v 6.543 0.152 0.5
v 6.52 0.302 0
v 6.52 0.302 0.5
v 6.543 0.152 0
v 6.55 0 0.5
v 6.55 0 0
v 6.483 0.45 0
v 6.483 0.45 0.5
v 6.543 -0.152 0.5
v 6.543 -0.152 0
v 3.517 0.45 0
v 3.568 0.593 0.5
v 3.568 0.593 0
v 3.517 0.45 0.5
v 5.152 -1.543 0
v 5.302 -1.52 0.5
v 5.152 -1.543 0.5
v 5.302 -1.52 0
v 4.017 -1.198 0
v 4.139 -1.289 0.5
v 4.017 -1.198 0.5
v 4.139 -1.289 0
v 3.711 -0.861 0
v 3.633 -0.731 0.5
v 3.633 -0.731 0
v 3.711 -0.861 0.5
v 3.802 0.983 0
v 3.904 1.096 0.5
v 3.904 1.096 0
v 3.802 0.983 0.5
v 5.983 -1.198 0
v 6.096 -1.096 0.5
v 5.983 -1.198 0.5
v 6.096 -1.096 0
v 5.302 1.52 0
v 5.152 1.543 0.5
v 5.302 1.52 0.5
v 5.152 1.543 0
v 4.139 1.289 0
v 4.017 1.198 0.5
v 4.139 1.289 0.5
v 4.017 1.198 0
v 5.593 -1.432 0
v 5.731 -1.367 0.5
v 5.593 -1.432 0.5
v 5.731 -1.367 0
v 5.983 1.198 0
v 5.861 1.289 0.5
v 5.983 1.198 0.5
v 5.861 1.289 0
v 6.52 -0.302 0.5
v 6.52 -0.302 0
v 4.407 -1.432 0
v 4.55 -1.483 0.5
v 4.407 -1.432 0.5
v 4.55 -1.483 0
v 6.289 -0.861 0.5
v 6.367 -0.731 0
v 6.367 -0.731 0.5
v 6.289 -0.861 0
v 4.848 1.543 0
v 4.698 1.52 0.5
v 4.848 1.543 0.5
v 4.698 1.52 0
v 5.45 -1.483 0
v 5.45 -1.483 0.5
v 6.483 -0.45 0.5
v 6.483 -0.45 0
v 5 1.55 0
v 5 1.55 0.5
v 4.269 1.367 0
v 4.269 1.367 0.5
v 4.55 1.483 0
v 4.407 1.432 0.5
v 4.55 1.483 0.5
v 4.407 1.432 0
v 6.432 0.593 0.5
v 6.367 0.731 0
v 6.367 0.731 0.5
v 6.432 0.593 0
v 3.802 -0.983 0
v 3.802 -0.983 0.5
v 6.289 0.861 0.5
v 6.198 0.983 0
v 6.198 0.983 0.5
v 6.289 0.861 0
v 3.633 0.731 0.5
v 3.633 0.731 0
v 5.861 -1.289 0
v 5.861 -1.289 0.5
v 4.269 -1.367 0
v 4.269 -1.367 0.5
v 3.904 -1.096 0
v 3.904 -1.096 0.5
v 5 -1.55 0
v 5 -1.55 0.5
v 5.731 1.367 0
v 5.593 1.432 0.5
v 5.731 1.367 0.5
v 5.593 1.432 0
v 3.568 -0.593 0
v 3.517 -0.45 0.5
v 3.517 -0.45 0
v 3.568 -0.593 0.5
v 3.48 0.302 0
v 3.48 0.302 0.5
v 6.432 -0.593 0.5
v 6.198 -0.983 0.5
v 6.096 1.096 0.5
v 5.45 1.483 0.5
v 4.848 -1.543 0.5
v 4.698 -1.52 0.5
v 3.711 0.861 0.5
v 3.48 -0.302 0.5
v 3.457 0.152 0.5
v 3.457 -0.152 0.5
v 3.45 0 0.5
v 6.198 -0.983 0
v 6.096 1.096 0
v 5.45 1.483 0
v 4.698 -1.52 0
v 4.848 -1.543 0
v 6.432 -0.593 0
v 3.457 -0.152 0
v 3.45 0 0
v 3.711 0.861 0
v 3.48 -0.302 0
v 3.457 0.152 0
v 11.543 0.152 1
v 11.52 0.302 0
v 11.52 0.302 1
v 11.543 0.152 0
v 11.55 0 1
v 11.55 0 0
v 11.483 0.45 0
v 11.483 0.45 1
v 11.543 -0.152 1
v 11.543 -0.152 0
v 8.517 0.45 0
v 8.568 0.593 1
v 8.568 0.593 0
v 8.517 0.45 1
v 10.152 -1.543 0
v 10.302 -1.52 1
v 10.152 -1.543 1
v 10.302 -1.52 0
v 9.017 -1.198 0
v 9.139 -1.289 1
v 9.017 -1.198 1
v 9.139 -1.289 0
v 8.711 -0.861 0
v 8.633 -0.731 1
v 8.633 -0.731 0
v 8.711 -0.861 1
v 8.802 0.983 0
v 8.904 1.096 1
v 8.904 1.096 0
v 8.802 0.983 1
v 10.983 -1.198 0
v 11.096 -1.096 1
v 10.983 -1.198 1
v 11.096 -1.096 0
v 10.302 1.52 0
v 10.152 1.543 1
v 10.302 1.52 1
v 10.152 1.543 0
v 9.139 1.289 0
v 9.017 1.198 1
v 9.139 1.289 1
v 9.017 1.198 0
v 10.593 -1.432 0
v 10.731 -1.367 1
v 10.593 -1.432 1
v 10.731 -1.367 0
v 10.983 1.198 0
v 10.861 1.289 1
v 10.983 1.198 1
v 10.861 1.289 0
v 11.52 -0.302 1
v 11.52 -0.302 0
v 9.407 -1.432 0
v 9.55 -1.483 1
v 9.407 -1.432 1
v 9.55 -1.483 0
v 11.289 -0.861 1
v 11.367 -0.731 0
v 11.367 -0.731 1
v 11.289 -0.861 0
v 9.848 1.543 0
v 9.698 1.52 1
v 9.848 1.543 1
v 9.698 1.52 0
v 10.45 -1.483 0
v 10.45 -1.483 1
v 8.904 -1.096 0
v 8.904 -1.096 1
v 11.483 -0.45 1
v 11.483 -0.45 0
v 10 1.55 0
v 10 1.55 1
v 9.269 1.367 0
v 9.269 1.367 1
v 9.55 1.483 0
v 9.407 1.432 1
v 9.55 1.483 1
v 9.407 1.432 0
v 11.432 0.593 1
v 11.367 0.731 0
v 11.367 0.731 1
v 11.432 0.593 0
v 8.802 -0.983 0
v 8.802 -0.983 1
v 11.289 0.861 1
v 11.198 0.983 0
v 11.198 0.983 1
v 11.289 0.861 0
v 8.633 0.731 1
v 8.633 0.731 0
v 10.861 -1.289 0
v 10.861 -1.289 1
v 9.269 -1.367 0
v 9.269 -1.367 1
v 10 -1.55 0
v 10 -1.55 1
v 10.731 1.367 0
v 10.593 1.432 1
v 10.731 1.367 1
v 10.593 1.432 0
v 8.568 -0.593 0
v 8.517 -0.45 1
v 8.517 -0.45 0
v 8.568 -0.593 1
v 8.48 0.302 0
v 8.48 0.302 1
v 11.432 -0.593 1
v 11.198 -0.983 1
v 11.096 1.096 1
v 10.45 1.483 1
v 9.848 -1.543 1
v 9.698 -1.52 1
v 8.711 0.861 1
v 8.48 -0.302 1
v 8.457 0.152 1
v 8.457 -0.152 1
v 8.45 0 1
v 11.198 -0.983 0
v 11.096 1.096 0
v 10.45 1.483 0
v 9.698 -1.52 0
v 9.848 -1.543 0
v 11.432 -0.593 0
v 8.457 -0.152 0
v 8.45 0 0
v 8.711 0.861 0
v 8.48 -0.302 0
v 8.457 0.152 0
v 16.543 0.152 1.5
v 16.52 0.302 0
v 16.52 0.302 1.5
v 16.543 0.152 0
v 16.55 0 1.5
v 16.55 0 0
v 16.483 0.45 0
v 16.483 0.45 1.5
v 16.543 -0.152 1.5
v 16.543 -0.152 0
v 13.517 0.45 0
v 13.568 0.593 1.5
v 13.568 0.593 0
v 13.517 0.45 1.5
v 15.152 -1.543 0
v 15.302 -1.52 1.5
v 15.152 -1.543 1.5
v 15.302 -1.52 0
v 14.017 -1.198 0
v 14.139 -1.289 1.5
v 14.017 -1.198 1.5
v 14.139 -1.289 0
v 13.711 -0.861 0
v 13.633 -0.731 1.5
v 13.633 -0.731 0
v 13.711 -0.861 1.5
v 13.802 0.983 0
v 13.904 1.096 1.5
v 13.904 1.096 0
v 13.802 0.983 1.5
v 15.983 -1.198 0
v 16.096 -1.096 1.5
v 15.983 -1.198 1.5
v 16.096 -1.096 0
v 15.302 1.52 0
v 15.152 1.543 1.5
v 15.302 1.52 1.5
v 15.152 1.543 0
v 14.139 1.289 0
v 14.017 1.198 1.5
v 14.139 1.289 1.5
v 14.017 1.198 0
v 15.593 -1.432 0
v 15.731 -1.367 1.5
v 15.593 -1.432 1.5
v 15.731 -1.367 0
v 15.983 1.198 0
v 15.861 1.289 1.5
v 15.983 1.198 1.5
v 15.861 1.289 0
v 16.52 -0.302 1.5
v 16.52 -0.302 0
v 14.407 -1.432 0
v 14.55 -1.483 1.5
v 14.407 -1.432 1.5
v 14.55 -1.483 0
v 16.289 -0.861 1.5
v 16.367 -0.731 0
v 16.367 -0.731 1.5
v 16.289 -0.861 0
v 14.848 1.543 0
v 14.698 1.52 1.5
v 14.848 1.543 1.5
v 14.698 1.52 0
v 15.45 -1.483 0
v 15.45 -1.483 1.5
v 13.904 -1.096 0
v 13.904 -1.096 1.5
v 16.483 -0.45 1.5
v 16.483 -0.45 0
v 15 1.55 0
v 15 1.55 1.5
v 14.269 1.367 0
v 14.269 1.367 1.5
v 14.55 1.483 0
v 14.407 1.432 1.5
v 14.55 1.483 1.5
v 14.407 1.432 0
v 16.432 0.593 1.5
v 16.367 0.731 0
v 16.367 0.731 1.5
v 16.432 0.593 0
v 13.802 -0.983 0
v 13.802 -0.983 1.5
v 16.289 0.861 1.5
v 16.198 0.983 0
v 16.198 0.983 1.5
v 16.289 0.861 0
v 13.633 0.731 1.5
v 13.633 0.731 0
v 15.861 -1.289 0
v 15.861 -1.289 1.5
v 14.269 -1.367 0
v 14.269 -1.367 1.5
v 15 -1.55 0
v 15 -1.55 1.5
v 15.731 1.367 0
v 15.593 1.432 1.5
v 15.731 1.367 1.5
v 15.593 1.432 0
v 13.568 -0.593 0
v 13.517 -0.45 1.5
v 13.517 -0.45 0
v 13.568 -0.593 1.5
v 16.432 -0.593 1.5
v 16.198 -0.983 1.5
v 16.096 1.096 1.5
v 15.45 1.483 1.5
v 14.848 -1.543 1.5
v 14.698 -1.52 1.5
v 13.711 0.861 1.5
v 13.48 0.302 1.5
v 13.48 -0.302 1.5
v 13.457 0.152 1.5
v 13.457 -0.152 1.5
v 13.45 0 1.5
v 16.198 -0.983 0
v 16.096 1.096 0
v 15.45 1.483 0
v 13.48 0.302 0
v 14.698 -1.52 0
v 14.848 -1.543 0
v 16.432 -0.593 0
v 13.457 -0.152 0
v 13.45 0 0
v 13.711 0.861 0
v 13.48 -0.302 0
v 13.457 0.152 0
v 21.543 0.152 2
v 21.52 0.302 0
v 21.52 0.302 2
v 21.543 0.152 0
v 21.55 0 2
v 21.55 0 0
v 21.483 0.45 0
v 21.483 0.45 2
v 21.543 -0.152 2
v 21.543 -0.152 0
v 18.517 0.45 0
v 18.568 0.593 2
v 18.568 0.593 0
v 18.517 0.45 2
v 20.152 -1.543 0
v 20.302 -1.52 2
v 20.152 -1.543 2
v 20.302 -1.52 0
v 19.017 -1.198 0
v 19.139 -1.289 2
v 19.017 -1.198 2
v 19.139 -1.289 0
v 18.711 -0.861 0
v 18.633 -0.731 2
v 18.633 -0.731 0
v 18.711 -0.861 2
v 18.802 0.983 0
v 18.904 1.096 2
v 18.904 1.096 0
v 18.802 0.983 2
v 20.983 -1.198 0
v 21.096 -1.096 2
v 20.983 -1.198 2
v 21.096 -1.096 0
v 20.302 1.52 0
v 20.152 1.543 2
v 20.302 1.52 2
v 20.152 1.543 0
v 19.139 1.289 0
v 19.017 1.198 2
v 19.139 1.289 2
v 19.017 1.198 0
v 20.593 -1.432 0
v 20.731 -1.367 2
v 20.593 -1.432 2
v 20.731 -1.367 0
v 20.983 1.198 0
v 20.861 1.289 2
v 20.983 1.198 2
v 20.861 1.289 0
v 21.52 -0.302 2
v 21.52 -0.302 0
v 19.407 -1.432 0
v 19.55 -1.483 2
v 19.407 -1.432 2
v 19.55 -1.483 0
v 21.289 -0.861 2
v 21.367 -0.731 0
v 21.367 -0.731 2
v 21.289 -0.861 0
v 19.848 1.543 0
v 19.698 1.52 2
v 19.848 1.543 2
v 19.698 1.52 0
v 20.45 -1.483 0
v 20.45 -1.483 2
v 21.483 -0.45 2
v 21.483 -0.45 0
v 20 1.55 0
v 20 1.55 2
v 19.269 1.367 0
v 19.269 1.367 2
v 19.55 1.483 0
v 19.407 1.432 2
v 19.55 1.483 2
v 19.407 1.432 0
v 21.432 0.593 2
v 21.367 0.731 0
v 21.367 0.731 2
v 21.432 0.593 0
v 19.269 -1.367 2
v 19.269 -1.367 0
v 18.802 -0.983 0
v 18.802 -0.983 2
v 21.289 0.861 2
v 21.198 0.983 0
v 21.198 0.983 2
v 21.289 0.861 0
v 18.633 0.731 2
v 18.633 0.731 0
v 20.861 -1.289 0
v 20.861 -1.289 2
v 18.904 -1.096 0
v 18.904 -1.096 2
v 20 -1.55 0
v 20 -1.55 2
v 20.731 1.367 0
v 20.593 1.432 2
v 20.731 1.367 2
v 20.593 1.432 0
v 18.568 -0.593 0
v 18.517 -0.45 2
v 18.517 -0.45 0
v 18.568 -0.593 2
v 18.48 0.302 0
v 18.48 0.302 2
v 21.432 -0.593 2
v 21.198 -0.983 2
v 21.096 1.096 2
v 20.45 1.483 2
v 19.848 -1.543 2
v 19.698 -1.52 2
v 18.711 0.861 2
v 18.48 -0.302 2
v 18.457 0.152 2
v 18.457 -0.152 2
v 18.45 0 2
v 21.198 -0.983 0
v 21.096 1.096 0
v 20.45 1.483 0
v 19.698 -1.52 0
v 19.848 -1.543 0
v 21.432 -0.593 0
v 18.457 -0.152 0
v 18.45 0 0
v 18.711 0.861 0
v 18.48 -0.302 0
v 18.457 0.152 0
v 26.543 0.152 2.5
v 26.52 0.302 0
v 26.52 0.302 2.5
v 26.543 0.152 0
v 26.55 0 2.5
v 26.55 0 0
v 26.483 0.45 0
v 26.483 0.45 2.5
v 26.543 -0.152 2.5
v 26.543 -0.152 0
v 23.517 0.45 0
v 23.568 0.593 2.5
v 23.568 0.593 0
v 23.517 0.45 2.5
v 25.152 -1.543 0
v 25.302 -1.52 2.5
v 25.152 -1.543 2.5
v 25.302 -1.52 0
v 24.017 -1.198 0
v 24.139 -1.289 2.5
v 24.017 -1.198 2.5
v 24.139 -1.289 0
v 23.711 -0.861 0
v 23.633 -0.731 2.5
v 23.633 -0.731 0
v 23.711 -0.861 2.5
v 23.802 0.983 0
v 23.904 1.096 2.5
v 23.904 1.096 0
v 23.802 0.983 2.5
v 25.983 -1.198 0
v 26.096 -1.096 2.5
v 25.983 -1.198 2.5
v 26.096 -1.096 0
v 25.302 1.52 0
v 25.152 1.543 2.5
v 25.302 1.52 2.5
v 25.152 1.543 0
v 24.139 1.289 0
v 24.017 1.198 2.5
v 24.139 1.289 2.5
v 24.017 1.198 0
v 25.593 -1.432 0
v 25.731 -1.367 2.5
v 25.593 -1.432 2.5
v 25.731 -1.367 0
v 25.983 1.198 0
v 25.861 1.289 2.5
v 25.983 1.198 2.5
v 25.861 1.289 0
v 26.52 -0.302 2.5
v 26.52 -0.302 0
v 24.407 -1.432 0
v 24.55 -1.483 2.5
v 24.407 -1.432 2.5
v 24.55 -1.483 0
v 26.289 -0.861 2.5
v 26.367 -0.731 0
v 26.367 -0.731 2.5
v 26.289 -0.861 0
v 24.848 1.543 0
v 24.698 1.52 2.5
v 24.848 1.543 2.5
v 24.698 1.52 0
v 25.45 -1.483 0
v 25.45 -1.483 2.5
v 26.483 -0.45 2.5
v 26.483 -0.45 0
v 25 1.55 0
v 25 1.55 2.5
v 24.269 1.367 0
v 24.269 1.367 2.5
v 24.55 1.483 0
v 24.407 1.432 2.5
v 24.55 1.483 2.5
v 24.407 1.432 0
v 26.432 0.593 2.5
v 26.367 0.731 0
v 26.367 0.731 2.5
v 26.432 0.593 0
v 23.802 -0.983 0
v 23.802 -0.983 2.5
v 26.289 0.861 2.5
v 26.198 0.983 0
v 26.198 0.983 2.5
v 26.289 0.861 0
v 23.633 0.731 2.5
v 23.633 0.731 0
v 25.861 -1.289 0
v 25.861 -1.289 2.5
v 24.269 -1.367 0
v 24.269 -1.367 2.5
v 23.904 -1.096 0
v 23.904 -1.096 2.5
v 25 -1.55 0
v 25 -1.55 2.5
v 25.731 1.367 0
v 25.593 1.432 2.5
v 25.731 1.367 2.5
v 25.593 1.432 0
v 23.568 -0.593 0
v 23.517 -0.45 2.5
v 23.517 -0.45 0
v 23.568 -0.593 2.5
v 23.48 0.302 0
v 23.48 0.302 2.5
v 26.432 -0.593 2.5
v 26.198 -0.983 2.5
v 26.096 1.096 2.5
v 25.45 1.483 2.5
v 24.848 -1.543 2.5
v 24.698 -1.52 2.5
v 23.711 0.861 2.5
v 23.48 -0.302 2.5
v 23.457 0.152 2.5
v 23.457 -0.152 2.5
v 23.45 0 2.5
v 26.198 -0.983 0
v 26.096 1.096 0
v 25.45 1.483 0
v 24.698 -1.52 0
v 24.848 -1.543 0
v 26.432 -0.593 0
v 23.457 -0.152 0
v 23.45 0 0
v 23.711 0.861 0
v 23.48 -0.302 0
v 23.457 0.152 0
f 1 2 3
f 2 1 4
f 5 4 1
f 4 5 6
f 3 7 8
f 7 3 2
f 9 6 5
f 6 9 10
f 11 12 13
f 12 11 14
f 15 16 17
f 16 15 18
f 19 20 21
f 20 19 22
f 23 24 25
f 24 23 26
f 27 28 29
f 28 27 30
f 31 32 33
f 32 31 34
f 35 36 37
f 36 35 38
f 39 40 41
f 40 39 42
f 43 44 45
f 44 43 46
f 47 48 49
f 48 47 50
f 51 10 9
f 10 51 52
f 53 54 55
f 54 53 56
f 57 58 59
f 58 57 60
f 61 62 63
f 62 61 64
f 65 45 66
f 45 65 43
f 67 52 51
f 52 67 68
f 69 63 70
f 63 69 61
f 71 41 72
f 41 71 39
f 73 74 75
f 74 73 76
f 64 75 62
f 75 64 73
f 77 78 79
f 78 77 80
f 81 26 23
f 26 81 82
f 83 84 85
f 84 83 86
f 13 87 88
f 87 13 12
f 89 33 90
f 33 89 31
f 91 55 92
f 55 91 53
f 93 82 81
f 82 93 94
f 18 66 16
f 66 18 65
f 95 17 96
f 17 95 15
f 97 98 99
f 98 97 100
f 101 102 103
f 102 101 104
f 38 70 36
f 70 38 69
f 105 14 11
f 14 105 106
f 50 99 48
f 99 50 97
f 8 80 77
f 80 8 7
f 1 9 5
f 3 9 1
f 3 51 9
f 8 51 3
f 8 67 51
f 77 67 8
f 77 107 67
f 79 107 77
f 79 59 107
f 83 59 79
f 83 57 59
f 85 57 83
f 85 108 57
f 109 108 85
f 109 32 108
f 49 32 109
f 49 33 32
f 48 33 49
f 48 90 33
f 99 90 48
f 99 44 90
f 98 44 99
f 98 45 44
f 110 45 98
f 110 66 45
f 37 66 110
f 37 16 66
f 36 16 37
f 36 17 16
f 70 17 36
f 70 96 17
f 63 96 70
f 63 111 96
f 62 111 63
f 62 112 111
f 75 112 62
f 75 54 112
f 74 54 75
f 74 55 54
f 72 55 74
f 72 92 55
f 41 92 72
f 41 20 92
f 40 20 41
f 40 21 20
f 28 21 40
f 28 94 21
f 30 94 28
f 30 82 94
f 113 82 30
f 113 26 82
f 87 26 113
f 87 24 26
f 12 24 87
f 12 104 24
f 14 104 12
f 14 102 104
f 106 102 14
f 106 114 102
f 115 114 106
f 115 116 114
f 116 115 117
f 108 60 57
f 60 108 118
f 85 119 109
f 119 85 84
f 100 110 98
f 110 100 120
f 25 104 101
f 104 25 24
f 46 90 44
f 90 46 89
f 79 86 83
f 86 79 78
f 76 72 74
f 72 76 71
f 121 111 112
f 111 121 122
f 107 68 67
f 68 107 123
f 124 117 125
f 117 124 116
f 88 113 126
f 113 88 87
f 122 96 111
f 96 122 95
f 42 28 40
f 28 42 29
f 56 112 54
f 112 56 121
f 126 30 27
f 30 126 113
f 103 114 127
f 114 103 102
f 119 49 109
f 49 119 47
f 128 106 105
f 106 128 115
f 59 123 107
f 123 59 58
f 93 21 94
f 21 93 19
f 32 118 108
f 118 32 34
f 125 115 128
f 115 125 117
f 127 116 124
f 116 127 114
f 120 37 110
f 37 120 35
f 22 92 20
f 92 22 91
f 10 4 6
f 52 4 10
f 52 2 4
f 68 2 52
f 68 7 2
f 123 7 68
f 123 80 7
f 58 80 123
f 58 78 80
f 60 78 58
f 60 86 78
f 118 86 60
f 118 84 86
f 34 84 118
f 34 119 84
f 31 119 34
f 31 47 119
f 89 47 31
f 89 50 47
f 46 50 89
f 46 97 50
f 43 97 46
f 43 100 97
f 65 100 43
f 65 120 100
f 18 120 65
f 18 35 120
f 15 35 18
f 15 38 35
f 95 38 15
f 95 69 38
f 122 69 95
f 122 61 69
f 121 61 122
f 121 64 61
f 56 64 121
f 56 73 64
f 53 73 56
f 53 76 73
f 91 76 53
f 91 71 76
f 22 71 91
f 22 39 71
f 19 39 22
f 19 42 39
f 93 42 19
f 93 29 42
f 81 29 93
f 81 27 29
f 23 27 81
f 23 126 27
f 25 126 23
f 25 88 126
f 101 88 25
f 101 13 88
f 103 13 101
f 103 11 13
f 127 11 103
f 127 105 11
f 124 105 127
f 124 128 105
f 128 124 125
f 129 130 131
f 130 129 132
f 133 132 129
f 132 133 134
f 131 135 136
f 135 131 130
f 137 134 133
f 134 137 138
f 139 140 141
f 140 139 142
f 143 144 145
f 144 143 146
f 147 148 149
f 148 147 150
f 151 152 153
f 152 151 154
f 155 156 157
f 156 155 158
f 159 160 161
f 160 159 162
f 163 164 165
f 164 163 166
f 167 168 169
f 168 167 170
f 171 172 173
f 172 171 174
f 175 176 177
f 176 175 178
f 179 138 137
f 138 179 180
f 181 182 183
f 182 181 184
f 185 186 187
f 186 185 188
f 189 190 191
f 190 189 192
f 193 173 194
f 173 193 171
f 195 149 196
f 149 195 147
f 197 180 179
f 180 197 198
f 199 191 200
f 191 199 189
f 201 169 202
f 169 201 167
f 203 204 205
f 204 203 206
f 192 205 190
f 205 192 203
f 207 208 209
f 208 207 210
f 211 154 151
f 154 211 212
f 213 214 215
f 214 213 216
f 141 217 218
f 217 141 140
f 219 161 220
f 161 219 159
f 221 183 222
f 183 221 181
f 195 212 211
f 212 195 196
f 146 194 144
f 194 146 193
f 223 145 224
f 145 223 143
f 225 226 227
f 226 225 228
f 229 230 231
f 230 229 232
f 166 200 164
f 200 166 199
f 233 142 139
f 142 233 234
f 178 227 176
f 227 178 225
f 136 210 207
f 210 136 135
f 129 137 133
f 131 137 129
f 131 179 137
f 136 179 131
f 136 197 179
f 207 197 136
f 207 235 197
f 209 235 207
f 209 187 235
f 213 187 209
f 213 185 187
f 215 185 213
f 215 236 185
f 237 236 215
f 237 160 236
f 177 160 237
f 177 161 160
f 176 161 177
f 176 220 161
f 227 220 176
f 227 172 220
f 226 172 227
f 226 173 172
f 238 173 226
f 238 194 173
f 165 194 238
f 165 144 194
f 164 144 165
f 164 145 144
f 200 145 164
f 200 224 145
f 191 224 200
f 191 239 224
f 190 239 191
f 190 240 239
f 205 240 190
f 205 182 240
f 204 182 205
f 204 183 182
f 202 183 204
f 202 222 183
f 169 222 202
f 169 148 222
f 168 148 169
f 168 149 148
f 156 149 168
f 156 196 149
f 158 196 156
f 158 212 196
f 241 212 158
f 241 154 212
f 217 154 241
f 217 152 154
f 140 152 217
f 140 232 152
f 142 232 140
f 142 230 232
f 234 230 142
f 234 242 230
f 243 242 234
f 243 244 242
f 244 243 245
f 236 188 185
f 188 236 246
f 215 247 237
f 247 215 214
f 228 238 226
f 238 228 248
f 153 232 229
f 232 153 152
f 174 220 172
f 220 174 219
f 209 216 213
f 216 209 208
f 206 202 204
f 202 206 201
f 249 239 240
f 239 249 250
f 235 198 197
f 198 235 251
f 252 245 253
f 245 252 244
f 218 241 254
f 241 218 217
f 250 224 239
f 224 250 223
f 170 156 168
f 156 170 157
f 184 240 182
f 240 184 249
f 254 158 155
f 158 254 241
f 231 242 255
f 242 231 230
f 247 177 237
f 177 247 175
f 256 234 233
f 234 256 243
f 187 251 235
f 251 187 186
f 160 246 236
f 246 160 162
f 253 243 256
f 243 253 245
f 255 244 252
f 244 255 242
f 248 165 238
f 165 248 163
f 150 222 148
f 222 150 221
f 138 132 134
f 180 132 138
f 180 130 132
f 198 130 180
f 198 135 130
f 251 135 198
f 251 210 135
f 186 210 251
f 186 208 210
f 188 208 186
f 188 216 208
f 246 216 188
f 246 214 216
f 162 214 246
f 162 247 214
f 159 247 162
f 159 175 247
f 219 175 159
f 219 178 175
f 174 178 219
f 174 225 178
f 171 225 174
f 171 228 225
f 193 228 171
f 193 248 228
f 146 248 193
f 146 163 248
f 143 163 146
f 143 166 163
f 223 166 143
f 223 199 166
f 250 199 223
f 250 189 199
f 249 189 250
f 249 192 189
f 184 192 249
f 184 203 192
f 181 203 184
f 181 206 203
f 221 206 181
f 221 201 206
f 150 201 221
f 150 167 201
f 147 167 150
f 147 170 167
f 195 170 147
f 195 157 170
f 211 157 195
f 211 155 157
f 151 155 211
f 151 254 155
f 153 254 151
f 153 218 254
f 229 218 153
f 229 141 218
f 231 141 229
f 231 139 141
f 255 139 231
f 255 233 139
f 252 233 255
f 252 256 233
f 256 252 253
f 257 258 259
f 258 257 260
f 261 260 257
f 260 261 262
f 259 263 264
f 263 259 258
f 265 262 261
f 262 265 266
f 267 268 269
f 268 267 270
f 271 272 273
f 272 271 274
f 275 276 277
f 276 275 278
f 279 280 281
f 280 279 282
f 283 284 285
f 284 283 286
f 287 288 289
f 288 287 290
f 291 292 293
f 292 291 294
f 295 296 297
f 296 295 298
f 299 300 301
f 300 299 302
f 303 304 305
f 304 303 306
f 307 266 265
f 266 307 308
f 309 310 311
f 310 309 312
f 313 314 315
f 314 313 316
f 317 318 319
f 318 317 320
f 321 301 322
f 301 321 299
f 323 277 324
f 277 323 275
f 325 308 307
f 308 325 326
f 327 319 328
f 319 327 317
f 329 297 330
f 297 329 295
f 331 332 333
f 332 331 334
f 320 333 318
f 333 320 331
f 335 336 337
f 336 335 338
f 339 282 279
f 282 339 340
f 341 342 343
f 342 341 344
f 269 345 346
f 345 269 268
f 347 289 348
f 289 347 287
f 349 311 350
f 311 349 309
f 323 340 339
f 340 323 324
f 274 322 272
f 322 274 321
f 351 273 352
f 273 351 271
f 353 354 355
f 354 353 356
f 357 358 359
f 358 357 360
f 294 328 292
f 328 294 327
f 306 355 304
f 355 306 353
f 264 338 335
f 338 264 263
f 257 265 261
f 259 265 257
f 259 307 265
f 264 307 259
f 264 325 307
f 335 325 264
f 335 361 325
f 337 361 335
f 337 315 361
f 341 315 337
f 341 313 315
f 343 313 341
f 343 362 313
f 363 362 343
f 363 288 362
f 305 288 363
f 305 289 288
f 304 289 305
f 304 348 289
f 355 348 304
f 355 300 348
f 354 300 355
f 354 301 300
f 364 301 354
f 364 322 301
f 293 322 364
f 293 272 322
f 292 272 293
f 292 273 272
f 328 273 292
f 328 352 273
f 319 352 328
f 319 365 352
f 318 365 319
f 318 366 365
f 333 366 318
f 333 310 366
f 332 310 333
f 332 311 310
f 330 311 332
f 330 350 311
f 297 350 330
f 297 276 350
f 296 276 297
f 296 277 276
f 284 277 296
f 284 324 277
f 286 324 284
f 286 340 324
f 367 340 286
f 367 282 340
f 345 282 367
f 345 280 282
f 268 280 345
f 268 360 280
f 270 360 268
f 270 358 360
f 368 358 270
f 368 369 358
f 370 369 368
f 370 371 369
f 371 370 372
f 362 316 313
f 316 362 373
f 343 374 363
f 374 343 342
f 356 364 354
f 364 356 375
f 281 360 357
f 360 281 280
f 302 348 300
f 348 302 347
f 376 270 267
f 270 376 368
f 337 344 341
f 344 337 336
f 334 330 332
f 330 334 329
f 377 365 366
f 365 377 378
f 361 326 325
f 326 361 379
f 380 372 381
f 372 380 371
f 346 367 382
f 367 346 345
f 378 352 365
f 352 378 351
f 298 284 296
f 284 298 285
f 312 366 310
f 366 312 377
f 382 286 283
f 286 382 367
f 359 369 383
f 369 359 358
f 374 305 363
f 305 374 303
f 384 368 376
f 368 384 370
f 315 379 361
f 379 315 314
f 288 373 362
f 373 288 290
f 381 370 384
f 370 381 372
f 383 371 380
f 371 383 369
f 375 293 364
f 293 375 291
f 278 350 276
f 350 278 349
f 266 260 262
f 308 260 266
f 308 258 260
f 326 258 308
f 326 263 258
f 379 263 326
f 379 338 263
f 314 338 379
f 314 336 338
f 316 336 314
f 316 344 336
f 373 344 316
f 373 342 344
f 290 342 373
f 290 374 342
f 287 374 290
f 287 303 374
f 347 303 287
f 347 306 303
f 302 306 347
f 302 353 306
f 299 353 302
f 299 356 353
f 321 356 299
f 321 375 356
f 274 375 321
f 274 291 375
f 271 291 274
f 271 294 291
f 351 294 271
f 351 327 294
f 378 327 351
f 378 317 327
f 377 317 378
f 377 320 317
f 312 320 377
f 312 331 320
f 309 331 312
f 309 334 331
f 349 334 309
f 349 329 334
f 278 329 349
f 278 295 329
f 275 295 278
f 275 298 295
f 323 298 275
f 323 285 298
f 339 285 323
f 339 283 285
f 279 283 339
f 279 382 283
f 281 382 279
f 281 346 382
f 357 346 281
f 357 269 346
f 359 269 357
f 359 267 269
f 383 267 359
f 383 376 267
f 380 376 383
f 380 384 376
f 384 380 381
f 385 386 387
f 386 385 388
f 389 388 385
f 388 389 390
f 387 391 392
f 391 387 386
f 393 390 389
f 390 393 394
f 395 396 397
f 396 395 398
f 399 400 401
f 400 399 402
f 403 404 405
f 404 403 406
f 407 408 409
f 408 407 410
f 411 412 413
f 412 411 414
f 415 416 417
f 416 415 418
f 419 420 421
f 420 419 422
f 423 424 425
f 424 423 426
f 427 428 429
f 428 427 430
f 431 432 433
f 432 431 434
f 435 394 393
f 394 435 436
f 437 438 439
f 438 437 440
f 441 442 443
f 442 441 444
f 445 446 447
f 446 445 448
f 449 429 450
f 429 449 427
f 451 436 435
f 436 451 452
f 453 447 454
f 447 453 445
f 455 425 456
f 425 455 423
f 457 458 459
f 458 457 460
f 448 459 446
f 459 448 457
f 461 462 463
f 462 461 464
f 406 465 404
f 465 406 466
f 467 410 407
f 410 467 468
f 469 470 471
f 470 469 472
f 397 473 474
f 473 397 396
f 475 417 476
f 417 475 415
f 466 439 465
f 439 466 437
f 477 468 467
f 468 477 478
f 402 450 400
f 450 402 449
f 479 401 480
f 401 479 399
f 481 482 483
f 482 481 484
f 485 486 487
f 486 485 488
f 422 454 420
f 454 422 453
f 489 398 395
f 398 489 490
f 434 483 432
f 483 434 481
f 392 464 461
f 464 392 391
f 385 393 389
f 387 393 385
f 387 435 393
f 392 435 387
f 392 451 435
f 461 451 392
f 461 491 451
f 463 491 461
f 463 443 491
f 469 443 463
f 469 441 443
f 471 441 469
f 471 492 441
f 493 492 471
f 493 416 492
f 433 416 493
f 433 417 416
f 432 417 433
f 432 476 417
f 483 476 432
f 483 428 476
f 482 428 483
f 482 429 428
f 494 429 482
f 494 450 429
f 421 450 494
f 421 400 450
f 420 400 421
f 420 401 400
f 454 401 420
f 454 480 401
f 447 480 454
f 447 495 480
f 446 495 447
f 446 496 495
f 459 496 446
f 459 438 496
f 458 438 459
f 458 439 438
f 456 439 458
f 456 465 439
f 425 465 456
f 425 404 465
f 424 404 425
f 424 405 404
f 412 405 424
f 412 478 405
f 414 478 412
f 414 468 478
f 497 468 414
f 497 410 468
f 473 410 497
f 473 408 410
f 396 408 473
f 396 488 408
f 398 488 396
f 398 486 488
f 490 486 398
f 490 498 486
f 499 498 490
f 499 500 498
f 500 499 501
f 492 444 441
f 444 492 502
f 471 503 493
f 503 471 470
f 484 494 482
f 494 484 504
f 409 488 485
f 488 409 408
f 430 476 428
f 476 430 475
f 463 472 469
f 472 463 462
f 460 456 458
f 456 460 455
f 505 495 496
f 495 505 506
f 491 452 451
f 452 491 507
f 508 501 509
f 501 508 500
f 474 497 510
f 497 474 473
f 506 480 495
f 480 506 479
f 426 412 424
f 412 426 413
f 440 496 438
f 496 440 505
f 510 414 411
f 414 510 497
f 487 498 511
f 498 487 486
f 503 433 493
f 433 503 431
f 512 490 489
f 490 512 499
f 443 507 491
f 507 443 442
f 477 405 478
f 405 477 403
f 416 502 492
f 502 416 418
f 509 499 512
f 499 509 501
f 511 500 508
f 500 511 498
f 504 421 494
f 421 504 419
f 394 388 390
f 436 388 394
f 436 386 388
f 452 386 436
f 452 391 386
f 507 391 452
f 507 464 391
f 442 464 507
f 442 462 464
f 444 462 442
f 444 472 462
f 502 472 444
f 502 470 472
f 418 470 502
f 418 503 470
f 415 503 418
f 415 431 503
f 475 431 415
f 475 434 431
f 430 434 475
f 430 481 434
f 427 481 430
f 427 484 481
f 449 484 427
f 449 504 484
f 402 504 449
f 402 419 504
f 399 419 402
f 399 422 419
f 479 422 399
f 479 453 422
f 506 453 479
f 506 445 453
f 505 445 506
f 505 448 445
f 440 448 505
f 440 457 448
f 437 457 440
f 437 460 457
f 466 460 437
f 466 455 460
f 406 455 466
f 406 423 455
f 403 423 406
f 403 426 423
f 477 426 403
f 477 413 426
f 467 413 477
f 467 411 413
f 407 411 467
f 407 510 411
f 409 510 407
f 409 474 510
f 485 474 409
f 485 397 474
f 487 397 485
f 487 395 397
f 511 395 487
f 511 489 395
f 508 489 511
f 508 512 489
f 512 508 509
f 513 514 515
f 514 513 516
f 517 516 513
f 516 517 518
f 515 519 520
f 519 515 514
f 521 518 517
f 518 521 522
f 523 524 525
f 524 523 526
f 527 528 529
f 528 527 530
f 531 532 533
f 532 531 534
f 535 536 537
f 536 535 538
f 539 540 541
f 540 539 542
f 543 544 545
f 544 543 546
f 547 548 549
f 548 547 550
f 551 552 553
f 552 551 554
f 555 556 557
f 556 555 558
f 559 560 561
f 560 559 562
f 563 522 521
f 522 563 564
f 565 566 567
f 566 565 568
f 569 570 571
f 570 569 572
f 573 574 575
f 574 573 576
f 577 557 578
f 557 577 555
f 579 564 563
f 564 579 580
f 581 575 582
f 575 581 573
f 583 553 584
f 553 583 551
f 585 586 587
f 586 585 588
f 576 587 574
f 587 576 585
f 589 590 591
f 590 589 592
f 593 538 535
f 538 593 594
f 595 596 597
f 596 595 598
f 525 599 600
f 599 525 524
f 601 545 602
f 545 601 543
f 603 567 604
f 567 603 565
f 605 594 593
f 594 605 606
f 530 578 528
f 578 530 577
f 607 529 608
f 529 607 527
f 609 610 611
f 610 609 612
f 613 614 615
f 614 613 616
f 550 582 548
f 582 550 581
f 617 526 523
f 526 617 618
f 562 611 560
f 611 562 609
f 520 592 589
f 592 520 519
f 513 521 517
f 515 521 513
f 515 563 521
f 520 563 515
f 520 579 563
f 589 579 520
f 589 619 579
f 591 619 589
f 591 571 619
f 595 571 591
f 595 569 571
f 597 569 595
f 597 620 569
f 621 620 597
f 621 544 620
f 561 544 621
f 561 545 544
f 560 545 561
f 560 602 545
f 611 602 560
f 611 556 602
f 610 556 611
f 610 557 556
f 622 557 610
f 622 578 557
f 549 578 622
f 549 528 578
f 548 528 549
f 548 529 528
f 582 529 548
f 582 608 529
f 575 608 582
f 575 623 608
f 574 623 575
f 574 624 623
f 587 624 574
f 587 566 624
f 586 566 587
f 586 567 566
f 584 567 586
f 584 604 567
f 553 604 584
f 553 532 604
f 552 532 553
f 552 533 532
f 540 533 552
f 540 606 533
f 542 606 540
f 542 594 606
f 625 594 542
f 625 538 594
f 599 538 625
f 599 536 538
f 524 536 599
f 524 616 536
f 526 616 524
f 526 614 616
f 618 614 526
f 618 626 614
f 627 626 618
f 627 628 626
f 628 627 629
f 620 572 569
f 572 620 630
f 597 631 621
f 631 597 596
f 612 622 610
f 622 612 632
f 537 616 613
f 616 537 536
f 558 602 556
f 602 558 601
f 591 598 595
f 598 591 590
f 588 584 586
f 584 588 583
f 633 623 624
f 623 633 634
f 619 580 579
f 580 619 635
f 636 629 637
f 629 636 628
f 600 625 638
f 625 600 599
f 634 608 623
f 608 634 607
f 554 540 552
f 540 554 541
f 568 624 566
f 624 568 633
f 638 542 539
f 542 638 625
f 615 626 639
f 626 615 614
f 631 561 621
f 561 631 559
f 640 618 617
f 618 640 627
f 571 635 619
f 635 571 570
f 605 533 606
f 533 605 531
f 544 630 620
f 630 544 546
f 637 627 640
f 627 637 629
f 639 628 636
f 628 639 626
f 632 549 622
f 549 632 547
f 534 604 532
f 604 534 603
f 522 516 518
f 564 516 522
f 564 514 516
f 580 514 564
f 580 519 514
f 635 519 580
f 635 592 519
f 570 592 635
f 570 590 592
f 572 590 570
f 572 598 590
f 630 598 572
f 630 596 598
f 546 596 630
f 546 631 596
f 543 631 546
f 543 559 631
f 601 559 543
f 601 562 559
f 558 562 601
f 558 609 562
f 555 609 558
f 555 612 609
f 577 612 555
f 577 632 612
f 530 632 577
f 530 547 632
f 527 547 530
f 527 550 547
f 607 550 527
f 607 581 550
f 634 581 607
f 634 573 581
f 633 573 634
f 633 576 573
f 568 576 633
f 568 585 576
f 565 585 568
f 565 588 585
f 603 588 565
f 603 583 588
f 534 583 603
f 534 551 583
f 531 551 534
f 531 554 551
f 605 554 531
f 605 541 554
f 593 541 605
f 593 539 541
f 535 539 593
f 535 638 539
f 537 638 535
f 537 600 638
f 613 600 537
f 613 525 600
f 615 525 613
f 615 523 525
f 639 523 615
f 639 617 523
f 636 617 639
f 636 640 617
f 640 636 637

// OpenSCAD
d = 3.1;

$fn = 64;

for (i=[1:5]) translate([5*i,0,0]) cylinder(d=d,h=i*0.5);
